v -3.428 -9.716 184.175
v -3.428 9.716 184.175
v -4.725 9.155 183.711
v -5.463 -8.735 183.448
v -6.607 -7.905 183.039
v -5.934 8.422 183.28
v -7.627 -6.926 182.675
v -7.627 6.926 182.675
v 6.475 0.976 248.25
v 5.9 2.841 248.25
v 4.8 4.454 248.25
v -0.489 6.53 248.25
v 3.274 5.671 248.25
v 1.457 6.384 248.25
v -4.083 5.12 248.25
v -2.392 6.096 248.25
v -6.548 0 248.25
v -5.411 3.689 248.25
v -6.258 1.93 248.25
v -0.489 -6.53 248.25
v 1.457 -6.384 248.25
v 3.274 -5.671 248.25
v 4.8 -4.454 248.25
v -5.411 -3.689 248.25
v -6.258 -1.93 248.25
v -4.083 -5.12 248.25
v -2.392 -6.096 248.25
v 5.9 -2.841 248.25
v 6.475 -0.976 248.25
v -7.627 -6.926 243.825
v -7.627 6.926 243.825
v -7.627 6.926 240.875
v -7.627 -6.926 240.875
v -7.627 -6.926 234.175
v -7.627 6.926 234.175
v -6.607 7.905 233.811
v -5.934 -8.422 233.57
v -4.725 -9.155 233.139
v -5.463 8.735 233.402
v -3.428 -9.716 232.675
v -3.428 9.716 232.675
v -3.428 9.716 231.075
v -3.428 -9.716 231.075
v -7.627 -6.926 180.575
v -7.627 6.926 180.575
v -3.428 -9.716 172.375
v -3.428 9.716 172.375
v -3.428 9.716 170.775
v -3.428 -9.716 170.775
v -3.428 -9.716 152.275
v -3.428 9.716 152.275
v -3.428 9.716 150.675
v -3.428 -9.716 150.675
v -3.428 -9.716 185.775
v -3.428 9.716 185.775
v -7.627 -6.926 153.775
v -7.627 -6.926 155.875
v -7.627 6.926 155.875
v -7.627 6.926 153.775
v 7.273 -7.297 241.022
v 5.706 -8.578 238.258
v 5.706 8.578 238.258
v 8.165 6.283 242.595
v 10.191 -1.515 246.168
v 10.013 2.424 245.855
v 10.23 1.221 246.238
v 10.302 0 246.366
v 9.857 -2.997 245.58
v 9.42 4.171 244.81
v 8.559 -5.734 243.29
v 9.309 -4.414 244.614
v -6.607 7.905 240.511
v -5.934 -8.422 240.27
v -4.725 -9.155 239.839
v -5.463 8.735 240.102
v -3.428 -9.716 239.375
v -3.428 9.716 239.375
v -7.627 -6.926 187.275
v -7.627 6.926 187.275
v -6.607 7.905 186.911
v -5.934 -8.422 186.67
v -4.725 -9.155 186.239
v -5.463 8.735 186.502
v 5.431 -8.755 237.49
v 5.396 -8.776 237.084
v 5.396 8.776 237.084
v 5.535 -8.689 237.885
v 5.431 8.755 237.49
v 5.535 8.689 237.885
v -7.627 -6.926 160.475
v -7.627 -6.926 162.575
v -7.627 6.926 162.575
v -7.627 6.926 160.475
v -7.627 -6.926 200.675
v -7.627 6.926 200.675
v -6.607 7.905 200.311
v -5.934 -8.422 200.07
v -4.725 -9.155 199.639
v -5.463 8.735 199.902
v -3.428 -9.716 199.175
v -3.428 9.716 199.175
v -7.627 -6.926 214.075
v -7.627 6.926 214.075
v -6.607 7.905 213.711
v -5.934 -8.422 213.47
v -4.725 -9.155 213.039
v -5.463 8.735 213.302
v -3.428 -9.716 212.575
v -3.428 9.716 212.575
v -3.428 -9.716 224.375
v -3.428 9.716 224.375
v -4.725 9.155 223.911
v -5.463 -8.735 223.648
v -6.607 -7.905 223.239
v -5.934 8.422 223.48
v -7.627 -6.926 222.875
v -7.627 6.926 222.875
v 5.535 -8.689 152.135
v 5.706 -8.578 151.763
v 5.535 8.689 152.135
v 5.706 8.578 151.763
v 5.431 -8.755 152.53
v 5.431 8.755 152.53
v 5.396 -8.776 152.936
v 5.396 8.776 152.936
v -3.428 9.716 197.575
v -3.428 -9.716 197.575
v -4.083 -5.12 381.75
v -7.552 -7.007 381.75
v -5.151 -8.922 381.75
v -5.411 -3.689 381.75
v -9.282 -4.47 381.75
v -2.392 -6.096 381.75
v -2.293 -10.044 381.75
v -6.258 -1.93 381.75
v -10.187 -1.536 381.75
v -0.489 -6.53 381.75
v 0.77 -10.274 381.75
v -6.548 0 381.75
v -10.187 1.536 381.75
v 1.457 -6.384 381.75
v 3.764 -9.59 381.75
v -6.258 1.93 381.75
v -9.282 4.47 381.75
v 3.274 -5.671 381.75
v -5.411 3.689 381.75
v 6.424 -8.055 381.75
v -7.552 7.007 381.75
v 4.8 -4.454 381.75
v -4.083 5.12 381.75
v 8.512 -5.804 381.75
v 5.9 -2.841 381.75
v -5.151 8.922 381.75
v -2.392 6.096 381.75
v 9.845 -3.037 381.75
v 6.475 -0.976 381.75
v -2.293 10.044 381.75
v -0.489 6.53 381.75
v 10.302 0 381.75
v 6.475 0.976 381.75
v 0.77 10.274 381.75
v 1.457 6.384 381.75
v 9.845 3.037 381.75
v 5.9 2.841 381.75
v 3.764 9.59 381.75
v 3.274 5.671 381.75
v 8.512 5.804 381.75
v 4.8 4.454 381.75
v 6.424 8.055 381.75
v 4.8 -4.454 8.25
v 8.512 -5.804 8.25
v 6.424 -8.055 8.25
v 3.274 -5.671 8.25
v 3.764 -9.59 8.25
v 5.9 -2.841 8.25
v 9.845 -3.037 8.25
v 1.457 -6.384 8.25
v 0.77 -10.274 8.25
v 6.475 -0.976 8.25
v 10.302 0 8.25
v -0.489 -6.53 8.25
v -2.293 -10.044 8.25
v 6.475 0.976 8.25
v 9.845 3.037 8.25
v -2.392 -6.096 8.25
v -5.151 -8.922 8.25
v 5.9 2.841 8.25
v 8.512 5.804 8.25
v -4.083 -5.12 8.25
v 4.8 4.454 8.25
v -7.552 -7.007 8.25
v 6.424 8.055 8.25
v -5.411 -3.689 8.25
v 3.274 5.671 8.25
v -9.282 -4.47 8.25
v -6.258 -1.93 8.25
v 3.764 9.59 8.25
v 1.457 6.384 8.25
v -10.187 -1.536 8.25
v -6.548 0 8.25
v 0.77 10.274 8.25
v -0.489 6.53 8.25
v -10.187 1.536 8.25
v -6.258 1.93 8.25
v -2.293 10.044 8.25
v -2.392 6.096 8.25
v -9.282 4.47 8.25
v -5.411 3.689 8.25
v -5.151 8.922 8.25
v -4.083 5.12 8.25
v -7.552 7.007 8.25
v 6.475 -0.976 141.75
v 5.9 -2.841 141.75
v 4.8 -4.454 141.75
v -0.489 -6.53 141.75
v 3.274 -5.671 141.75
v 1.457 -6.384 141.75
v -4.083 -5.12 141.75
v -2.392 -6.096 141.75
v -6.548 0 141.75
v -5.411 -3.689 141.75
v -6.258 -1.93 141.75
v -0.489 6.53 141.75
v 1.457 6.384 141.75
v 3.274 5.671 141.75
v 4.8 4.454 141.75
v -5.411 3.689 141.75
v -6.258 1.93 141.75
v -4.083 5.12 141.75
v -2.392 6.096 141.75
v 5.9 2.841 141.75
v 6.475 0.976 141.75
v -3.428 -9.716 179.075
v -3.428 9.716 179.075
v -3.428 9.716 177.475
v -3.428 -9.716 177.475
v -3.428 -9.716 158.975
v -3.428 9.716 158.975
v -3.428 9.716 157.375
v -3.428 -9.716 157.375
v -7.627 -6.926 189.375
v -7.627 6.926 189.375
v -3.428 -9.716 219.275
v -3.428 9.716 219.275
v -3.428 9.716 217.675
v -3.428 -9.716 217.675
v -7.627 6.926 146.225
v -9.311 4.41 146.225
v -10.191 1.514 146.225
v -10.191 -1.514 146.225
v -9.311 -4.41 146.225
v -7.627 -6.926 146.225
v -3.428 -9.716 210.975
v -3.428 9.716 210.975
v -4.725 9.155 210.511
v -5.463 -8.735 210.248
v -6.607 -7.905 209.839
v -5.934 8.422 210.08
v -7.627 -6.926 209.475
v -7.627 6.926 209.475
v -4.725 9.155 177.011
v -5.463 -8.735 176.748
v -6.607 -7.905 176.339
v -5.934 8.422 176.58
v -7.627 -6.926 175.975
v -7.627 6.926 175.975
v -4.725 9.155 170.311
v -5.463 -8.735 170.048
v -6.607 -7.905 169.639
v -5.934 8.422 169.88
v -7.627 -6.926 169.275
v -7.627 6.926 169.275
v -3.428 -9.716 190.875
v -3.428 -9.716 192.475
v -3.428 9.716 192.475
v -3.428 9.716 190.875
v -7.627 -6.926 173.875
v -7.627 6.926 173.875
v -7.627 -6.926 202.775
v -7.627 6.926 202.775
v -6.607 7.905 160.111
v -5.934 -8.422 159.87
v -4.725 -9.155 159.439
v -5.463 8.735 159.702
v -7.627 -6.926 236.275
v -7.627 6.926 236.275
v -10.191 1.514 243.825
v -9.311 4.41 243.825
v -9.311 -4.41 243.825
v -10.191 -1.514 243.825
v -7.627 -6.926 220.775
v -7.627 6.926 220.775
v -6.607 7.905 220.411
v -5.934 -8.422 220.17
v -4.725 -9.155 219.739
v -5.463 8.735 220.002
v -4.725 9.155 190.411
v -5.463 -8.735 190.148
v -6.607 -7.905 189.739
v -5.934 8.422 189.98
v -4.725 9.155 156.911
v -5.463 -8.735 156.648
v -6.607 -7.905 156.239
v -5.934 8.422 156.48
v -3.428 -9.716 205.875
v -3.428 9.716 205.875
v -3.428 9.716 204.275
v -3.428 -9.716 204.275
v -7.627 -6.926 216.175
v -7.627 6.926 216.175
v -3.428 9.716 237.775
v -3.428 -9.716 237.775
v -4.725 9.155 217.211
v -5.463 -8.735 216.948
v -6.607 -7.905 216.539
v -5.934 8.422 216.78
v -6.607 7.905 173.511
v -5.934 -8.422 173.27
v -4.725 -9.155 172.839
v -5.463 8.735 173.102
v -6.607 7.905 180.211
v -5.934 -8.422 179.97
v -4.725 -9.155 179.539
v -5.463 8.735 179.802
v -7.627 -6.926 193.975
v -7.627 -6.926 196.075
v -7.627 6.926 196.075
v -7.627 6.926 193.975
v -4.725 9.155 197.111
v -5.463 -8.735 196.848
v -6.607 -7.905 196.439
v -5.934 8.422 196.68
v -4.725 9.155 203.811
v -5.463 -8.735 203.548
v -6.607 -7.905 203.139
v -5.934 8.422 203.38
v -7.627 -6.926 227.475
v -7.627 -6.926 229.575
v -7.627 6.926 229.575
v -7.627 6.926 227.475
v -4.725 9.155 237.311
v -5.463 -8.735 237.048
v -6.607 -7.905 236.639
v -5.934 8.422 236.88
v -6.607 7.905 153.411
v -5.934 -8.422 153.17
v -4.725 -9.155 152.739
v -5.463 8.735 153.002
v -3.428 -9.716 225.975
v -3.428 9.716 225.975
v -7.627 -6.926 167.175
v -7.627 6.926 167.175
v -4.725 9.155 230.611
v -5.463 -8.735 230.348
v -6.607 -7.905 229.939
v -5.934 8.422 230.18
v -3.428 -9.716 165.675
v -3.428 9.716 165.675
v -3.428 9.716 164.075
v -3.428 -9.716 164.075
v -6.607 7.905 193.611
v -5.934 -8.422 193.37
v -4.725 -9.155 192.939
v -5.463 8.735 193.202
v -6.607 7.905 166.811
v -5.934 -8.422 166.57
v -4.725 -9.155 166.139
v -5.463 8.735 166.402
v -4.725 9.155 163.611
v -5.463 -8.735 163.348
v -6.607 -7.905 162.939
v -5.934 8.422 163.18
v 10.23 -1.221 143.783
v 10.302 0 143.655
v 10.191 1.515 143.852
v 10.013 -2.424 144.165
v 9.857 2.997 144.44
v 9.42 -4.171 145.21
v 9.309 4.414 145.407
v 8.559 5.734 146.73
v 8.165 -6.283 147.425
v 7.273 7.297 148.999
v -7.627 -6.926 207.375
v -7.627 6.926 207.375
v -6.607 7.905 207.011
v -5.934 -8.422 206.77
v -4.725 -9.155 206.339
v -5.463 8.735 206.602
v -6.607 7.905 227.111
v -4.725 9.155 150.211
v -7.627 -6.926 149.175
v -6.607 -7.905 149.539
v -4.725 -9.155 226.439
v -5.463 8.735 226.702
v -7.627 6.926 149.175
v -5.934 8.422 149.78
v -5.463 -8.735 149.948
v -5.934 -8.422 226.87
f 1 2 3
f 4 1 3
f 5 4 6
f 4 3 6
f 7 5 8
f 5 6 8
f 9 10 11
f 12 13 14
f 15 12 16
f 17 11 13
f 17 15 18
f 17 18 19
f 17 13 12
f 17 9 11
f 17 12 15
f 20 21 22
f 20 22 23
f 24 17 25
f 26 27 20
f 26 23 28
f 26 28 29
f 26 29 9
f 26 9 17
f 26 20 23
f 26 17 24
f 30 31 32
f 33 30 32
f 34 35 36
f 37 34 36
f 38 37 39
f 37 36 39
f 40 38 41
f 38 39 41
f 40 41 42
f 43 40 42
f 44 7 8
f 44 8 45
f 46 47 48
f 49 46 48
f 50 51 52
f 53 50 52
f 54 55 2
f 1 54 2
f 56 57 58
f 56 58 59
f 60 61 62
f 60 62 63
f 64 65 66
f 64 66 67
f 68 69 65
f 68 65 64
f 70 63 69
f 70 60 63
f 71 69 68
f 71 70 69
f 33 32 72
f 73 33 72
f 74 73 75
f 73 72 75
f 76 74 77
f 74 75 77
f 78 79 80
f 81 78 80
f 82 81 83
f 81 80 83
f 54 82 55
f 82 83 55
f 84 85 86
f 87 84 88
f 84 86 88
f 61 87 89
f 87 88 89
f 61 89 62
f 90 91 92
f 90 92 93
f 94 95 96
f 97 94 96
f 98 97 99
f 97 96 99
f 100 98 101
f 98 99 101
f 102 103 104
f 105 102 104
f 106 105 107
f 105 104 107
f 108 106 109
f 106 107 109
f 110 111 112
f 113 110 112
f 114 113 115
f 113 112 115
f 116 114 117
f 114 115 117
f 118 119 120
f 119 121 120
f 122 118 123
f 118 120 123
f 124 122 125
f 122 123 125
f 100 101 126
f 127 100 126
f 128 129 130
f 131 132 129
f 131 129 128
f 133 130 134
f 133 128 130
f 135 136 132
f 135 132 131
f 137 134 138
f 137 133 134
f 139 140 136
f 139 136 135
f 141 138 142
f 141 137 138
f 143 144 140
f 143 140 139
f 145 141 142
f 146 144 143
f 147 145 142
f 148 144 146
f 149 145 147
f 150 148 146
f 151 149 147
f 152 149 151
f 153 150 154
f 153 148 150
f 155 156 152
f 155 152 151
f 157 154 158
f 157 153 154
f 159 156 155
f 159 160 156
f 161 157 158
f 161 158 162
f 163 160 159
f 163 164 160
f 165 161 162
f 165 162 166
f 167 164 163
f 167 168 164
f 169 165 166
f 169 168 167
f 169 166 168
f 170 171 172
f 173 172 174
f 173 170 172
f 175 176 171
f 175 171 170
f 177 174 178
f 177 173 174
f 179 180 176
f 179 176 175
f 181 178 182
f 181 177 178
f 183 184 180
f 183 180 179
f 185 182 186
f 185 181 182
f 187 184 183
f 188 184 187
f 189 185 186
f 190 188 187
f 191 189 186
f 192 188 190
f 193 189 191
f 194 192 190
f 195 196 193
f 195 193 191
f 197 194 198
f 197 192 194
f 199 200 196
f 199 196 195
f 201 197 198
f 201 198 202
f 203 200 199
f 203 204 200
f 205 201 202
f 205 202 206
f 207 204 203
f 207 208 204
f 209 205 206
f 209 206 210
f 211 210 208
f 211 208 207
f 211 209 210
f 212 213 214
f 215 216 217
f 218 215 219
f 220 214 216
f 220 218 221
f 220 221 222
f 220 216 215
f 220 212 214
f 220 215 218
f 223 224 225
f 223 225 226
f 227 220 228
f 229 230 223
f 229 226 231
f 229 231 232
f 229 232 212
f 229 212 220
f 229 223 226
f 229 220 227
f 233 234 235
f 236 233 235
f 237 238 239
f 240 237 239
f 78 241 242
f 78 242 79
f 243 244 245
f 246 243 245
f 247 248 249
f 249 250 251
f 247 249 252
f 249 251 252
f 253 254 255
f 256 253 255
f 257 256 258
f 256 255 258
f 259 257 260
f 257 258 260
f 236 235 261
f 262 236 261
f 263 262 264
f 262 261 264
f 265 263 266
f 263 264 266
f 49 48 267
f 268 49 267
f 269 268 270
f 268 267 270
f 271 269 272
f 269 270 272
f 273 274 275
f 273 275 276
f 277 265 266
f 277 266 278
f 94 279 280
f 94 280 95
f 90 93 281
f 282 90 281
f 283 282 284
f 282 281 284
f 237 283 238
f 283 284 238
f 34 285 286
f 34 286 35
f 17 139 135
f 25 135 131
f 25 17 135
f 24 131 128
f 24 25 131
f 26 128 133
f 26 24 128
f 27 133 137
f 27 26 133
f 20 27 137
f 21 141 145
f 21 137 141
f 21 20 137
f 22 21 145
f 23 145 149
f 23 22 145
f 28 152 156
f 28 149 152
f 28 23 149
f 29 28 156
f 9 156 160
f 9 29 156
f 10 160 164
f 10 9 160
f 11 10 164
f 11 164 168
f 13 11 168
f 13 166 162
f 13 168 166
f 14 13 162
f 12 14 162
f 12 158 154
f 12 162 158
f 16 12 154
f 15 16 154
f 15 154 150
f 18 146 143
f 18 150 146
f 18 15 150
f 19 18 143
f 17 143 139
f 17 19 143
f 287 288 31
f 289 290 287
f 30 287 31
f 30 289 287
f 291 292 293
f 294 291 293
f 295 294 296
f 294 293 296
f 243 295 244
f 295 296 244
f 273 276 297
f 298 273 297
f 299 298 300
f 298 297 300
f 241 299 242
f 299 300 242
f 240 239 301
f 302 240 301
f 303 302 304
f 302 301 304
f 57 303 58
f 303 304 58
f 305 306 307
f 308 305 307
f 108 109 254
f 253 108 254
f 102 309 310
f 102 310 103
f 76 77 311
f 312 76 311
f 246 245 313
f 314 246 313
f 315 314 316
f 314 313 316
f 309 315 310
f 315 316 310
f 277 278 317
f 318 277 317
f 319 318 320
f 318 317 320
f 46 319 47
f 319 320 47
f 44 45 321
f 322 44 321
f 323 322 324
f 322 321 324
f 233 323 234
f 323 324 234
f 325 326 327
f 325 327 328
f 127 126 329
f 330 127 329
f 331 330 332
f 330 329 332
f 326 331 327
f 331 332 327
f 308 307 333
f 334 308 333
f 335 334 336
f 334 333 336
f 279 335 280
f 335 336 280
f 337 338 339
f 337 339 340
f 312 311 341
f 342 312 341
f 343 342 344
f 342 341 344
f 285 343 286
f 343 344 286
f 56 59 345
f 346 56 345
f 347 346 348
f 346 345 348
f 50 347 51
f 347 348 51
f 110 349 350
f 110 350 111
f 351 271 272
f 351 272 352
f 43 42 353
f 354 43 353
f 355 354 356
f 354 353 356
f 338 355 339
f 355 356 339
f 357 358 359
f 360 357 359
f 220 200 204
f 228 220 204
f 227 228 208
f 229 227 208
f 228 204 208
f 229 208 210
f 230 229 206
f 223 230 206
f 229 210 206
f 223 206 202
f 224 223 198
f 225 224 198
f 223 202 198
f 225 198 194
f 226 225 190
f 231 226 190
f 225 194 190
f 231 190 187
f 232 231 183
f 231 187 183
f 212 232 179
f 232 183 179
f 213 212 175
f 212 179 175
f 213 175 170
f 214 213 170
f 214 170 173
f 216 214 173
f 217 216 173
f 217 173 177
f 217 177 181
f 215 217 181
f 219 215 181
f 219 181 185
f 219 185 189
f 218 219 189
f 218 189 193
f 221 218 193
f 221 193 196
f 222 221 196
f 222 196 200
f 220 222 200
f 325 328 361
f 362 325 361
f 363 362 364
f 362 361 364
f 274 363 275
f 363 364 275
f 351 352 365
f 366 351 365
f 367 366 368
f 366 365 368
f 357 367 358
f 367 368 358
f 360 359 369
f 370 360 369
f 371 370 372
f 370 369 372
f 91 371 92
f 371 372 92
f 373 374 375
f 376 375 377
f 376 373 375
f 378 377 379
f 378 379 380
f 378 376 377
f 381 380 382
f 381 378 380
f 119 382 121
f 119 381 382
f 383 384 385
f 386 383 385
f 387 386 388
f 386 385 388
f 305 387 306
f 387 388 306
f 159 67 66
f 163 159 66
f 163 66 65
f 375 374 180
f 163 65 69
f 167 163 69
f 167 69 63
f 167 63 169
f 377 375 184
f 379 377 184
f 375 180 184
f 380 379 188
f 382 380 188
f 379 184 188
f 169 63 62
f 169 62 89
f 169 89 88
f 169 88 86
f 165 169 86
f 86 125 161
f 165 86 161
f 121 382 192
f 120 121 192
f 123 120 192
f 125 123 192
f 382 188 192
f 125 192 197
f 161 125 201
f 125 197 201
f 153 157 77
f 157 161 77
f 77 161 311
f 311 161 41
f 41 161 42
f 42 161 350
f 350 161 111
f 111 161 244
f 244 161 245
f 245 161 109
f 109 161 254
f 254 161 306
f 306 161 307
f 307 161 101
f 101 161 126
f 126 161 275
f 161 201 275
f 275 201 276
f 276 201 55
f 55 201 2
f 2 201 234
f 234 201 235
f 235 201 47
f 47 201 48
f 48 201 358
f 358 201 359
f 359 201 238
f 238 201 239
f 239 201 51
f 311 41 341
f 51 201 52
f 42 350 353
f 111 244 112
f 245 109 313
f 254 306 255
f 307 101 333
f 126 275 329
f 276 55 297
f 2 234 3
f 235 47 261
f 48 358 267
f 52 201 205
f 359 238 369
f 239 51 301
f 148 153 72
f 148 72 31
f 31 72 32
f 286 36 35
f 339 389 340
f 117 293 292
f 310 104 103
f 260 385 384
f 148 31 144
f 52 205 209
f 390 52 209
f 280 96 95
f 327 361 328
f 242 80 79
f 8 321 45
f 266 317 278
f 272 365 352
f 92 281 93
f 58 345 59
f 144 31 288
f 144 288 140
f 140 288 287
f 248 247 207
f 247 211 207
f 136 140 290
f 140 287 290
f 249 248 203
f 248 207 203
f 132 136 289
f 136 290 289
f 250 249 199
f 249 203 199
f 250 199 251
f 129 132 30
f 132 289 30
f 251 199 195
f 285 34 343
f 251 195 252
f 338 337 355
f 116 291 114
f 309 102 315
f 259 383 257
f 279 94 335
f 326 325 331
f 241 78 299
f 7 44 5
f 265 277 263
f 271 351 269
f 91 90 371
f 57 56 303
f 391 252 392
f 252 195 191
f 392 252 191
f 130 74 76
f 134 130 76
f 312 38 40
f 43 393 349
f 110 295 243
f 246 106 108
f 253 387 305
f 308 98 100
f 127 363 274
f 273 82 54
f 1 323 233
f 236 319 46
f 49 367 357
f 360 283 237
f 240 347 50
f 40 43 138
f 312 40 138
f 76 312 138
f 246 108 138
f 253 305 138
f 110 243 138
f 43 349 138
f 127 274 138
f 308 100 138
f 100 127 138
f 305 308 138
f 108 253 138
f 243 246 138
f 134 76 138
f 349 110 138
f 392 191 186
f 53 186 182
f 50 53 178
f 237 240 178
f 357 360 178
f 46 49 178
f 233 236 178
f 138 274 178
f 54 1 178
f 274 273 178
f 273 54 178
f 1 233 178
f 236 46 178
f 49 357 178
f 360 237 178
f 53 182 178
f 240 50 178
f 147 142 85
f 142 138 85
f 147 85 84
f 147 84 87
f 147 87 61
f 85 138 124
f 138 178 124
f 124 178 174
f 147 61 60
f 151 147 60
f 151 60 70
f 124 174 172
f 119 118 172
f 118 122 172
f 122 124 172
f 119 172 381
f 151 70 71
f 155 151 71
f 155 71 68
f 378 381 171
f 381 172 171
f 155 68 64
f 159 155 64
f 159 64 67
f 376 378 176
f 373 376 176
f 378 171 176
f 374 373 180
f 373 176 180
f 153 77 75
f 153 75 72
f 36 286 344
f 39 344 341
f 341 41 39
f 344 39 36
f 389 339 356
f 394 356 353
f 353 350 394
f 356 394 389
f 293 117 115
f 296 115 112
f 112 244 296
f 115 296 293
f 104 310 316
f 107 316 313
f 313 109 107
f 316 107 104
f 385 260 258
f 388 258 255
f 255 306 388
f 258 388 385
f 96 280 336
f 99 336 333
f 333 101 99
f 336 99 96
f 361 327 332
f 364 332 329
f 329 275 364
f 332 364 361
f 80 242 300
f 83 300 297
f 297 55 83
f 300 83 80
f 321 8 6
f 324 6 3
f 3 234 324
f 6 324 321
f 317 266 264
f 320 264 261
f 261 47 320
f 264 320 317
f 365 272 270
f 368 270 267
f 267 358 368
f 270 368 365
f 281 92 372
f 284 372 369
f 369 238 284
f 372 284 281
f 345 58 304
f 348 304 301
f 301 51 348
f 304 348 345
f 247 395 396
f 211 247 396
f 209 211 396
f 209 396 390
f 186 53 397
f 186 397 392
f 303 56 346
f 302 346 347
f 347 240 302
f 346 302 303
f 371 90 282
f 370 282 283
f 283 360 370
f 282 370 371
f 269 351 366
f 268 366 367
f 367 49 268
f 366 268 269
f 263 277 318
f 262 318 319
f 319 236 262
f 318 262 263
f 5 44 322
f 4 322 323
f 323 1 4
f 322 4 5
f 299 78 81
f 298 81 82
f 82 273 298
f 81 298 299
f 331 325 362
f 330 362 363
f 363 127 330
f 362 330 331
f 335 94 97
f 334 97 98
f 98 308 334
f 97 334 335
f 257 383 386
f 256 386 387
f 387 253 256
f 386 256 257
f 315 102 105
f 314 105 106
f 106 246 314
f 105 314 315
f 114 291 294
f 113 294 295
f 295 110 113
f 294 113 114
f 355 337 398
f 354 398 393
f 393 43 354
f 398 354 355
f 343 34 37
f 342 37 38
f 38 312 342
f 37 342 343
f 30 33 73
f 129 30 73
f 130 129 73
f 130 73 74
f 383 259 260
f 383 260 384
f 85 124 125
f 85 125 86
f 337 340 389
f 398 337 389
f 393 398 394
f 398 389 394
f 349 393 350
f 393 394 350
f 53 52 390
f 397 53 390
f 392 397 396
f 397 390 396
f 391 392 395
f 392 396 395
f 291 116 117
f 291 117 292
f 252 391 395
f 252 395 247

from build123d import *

# Parameters (mm, degrees)
SKETCH1_R               = 10.3025
BOSS_EXTRUDE1_DEPTH     = 390
SKETCH2_R               = 6.5485
CUT_EXTRUDE1_DEPTH      = 141.75
CUT_EXTRUDE2_START      = -141.75
SKETCH3_R               = 6.5485
CUT_EXTRUDE2_DEPTH      = 141.75
CUT_EXTRUDE3_DEPTH      = 20
CUT_EXTRUDE3_DEPTH_BACK = 20
SKETCH4_W               = 2.8
SKETCH4_H               = 97.6
CUT_EXTRUDE4_DEPTH      = 20
LPATTERN1_COUNT         = 14
LPATTERN1_PITCH         = 6.7
SKETCH6_W               = 24.776384874
SKETCH6_H               = 25.11648024
CUT_EXTRUDE5_DEPTH      = 8.25
SKETCH7_W               = 32.905320966
SKETCH7_H               = 32.372251486
CUT_EXTRUDE6_DEPTH      = 8.25
FILLET2_R               = 2.38


with BuildPart() as part:
    # Sketch1 → Boss-Extrude1 (new body)
    with BuildSketch(Plane.XY):
        Circle(SKETCH1_R)
    extrude(amount=BOSS_EXTRUDE1_DEPTH)

    # Sketch2 → Cut-Extrude1 (cut)
    with BuildSketch(Plane(origin=(0, 0, 0), x_dir=(-1, 0, 0), z_dir=(0, 0, -1))):
        Circle(SKETCH2_R)
    extrude(amount=-CUT_EXTRUDE1_DEPTH, mode=Mode.SUBTRACT)

    # Sketch3 → Cut-Extrude2 (cut)
    with BuildSketch(Plane.XY.offset(390).offset(CUT_EXTRUDE2_START)):
        Circle(SKETCH3_R)
    extrude(amount=CUT_EXTRUDE2_DEPTH, mode=Mode.SUBTRACT)

    # Sketch4 → Cut-Extrude3 (cut, two sides: drawn at the far end of the back side and taken through both)
    with BuildSketch(Plane(origin=(0, 0, 0), x_dir=(1, 0, 0), z_dir=(0, 1, 0)).offset(-CUT_EXTRUDE3_DEPTH_BACK)):
        with Locations((-9.0275, -195.025)):
            Rectangle(SKETCH4_W, SKETCH4_H)
        Polygon((10.438224829, -246.605018761), (10.438224829, -143.415160631), (5.396274252, -152.308643269), (5.396274252, -237.711536124), align=None)
    extrude(amount=CUT_EXTRUDE3_DEPTH + CUT_EXTRUDE3_DEPTH_BACK, mode=Mode.SUBTRACT)

    # Sketch5 → Cut-Extrude4 (cut, symmetric)
    with BuildSketch(Plane(origin=(0, 0, 0), x_dir=(1, 0, 0), z_dir=(0, 1, 0))):
        Polygon((-3.4275, -152.275), (-3.4275, -150.675), (-7.6275, -149.175), (-7.6275, -153.775), align=None)
    cut_extrude4 = extrude(amount=CUT_EXTRUDE4_DEPTH, both=True, mode=Mode.SUBTRACT)

    # LPattern1: Cut-Extrude4 ×14
    with Locations(*[(0, 0, i * LPATTERN1_PITCH) for i in range(1, LPATTERN1_COUNT)]):
        add(cut_extrude4, mode=Mode.SUBTRACT)

    # Sketch6 → Cut-Extrude5 (cut)
    with BuildSketch(Plane.XY.offset(390)):
        Rectangle(SKETCH6_W, SKETCH6_H)
    extrude(amount=-CUT_EXTRUDE5_DEPTH, mode=Mode.SUBTRACT)

    # Sketch7 → Cut-Extrude6 (cut)
    with BuildSketch(Plane(origin=(0, 0, 0), x_dir=(-1, 0, 0), z_dir=(0, 0, -1))):
        Rectangle(SKETCH7_W, SKETCH7_H)
    extrude(amount=-CUT_EXTRUDE6_DEPTH, mode=Mode.SUBTRACT)

    # Fillet2
    fillet2_edges = [part.edges().sort_by_distance(p)[0] for p in [
        (5.396274252, 0, 237.711536124),
        (5.396274252, 0, 152.308643269),
    ]]
    fillet(fillet2_edges, radius=FILLET2_R)


solid = part.part
